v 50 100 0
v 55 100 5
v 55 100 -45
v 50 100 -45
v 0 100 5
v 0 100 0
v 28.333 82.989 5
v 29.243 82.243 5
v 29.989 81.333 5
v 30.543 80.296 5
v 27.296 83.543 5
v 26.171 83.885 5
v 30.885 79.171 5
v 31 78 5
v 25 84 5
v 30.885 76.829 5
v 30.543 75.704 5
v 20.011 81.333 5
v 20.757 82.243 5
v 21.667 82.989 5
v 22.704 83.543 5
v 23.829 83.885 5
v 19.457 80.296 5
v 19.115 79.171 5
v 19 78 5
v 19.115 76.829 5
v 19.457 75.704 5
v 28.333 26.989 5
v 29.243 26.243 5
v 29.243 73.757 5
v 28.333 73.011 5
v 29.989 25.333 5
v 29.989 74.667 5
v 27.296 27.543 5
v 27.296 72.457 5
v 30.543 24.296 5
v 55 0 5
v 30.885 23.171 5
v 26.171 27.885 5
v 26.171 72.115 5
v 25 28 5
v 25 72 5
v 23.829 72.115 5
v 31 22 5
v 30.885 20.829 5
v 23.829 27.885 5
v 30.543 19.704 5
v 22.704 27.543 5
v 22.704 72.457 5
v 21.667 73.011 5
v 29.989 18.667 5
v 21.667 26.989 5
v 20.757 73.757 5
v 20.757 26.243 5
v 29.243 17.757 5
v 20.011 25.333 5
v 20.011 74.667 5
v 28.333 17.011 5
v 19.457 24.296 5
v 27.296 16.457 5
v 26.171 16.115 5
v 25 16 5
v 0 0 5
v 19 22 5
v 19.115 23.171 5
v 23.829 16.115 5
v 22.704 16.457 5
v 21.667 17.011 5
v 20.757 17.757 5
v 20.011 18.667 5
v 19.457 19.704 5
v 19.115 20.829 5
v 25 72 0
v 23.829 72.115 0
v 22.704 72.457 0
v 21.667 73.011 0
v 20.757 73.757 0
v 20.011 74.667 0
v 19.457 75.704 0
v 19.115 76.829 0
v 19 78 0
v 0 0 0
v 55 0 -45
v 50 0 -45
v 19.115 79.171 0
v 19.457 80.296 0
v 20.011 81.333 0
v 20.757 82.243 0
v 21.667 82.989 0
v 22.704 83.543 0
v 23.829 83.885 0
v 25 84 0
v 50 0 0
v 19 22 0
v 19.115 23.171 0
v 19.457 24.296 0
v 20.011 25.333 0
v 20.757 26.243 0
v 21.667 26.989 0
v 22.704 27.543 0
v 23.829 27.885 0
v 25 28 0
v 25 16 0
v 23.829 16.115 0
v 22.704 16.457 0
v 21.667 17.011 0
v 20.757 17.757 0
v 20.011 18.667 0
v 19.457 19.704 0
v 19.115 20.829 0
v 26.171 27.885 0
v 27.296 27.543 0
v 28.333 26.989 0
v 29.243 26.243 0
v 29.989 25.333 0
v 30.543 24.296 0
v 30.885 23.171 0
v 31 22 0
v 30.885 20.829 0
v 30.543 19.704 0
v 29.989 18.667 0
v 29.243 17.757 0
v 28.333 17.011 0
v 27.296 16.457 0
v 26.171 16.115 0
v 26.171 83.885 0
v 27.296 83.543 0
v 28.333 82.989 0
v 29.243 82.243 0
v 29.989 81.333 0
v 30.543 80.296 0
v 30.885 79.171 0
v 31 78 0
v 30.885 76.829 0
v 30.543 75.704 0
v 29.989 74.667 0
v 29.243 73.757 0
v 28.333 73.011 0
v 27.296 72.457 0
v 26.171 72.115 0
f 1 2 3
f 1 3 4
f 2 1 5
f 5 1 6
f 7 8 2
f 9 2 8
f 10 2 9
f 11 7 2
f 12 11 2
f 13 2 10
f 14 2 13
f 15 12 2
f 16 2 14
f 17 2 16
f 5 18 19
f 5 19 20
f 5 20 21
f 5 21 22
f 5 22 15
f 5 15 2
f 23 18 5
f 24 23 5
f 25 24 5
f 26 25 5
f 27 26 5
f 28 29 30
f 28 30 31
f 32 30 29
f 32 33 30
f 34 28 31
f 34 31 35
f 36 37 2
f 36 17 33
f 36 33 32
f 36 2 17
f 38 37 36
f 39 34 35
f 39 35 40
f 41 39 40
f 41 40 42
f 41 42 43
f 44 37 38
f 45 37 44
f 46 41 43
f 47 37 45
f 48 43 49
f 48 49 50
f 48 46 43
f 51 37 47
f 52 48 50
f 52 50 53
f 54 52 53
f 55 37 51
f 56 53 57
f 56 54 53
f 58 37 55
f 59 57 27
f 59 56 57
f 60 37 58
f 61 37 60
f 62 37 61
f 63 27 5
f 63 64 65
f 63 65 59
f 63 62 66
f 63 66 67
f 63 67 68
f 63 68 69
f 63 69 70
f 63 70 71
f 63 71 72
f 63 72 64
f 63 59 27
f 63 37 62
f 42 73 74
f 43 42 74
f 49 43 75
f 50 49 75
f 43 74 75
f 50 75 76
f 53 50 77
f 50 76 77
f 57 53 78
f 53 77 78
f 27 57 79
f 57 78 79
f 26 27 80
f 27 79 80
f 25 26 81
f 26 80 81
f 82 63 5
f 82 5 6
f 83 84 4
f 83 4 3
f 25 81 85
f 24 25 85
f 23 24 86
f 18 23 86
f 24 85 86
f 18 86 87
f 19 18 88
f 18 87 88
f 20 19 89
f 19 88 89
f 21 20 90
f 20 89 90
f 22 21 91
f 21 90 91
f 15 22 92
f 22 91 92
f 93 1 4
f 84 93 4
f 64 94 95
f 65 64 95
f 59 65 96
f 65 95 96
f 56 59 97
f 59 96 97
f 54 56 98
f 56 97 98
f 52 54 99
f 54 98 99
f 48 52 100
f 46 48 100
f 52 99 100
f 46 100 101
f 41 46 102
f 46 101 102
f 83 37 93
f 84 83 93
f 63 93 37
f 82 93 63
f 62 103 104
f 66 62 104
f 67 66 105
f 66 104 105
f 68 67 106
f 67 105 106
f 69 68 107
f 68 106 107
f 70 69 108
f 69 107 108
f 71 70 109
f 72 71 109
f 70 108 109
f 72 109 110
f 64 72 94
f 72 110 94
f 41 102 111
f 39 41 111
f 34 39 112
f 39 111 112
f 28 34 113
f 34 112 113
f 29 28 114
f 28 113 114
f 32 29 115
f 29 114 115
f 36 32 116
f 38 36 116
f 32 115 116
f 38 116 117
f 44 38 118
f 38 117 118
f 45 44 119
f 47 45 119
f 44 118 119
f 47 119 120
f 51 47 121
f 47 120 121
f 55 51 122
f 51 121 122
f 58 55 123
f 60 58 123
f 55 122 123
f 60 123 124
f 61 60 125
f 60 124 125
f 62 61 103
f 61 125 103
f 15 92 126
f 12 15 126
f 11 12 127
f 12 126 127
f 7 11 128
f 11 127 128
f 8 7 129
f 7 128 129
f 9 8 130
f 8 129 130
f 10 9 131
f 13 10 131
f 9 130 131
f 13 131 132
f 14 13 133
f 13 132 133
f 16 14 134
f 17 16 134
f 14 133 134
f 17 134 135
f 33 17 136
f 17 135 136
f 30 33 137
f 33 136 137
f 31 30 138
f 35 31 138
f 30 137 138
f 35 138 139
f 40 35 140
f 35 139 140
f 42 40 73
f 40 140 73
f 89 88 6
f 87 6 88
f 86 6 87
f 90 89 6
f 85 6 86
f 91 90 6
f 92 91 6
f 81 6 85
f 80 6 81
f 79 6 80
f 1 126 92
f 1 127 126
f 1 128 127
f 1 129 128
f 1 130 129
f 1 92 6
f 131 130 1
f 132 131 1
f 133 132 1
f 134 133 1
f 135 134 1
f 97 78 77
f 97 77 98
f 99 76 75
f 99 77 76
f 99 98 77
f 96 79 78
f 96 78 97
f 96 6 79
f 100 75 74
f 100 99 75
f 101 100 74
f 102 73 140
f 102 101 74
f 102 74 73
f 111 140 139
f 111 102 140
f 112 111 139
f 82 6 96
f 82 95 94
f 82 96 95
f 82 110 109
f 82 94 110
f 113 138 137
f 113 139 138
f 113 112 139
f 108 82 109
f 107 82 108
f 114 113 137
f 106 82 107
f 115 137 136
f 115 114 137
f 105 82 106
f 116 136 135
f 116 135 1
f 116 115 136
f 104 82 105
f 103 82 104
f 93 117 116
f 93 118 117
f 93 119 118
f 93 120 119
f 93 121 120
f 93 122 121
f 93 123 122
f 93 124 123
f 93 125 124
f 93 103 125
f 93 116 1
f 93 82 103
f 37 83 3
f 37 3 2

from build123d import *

# Parameters (mm, degrees)
BOSS_EXTRUDE2_DEPTH = 100
CUT_EXTRUDE1_DEPTH  = 100


with BuildPart() as part:
    # Sketch1 → Boss-Extrude2 (new body)
    with BuildSketch(Plane(origin=(0, 0, 0), x_dir=(1, 0, 0), z_dir=(0, 1, 0))):
        Polygon((0, 0), (50, 0), (50, 45), (55, 45), (55, -5), (0, -5), align=None)
    extrude(amount=BOSS_EXTRUDE2_DEPTH)

    # Sketch2 → Cut-Extrude1 (cut)
    with BuildSketch(Plane(origin=(0, 0, 0), x_dir=(-1, 0, 0), z_dir=(0, 0, -1))):
        with BuildLine():
            ThreePointArc((-25, 28), (-31, 22), (-25, 16))
            Line((-25, 16), (-25, 28))
        make_face()
        with BuildLine():
            Line((-25, 28), (-25, 16))
            ThreePointArc((-25, 16), (-20.757359313, 17.757359313), (-19, 22))
            ThreePointArc((-19, 22), (-20.757359313, 26.242640687), (-25, 28))
        make_face()
        with BuildLine():
            ThreePointArc((-25, 84), (-31, 78), (-25, 72))
            Line((-25, 72), (-25, 84))
        make_face()
        with BuildLine():
            Line((-25, 84), (-25, 72))
            ThreePointArc((-25, 72), (-20.757359313, 73.757359313), (-19, 78))
            ThreePointArc((-19, 78), (-20.757359313, 82.242640687), (-25, 84))
        make_face()
    extrude(amount=-CUT_EXTRUDE1_DEPTH, mode=Mode.SUBTRACT)


solid = part.part
